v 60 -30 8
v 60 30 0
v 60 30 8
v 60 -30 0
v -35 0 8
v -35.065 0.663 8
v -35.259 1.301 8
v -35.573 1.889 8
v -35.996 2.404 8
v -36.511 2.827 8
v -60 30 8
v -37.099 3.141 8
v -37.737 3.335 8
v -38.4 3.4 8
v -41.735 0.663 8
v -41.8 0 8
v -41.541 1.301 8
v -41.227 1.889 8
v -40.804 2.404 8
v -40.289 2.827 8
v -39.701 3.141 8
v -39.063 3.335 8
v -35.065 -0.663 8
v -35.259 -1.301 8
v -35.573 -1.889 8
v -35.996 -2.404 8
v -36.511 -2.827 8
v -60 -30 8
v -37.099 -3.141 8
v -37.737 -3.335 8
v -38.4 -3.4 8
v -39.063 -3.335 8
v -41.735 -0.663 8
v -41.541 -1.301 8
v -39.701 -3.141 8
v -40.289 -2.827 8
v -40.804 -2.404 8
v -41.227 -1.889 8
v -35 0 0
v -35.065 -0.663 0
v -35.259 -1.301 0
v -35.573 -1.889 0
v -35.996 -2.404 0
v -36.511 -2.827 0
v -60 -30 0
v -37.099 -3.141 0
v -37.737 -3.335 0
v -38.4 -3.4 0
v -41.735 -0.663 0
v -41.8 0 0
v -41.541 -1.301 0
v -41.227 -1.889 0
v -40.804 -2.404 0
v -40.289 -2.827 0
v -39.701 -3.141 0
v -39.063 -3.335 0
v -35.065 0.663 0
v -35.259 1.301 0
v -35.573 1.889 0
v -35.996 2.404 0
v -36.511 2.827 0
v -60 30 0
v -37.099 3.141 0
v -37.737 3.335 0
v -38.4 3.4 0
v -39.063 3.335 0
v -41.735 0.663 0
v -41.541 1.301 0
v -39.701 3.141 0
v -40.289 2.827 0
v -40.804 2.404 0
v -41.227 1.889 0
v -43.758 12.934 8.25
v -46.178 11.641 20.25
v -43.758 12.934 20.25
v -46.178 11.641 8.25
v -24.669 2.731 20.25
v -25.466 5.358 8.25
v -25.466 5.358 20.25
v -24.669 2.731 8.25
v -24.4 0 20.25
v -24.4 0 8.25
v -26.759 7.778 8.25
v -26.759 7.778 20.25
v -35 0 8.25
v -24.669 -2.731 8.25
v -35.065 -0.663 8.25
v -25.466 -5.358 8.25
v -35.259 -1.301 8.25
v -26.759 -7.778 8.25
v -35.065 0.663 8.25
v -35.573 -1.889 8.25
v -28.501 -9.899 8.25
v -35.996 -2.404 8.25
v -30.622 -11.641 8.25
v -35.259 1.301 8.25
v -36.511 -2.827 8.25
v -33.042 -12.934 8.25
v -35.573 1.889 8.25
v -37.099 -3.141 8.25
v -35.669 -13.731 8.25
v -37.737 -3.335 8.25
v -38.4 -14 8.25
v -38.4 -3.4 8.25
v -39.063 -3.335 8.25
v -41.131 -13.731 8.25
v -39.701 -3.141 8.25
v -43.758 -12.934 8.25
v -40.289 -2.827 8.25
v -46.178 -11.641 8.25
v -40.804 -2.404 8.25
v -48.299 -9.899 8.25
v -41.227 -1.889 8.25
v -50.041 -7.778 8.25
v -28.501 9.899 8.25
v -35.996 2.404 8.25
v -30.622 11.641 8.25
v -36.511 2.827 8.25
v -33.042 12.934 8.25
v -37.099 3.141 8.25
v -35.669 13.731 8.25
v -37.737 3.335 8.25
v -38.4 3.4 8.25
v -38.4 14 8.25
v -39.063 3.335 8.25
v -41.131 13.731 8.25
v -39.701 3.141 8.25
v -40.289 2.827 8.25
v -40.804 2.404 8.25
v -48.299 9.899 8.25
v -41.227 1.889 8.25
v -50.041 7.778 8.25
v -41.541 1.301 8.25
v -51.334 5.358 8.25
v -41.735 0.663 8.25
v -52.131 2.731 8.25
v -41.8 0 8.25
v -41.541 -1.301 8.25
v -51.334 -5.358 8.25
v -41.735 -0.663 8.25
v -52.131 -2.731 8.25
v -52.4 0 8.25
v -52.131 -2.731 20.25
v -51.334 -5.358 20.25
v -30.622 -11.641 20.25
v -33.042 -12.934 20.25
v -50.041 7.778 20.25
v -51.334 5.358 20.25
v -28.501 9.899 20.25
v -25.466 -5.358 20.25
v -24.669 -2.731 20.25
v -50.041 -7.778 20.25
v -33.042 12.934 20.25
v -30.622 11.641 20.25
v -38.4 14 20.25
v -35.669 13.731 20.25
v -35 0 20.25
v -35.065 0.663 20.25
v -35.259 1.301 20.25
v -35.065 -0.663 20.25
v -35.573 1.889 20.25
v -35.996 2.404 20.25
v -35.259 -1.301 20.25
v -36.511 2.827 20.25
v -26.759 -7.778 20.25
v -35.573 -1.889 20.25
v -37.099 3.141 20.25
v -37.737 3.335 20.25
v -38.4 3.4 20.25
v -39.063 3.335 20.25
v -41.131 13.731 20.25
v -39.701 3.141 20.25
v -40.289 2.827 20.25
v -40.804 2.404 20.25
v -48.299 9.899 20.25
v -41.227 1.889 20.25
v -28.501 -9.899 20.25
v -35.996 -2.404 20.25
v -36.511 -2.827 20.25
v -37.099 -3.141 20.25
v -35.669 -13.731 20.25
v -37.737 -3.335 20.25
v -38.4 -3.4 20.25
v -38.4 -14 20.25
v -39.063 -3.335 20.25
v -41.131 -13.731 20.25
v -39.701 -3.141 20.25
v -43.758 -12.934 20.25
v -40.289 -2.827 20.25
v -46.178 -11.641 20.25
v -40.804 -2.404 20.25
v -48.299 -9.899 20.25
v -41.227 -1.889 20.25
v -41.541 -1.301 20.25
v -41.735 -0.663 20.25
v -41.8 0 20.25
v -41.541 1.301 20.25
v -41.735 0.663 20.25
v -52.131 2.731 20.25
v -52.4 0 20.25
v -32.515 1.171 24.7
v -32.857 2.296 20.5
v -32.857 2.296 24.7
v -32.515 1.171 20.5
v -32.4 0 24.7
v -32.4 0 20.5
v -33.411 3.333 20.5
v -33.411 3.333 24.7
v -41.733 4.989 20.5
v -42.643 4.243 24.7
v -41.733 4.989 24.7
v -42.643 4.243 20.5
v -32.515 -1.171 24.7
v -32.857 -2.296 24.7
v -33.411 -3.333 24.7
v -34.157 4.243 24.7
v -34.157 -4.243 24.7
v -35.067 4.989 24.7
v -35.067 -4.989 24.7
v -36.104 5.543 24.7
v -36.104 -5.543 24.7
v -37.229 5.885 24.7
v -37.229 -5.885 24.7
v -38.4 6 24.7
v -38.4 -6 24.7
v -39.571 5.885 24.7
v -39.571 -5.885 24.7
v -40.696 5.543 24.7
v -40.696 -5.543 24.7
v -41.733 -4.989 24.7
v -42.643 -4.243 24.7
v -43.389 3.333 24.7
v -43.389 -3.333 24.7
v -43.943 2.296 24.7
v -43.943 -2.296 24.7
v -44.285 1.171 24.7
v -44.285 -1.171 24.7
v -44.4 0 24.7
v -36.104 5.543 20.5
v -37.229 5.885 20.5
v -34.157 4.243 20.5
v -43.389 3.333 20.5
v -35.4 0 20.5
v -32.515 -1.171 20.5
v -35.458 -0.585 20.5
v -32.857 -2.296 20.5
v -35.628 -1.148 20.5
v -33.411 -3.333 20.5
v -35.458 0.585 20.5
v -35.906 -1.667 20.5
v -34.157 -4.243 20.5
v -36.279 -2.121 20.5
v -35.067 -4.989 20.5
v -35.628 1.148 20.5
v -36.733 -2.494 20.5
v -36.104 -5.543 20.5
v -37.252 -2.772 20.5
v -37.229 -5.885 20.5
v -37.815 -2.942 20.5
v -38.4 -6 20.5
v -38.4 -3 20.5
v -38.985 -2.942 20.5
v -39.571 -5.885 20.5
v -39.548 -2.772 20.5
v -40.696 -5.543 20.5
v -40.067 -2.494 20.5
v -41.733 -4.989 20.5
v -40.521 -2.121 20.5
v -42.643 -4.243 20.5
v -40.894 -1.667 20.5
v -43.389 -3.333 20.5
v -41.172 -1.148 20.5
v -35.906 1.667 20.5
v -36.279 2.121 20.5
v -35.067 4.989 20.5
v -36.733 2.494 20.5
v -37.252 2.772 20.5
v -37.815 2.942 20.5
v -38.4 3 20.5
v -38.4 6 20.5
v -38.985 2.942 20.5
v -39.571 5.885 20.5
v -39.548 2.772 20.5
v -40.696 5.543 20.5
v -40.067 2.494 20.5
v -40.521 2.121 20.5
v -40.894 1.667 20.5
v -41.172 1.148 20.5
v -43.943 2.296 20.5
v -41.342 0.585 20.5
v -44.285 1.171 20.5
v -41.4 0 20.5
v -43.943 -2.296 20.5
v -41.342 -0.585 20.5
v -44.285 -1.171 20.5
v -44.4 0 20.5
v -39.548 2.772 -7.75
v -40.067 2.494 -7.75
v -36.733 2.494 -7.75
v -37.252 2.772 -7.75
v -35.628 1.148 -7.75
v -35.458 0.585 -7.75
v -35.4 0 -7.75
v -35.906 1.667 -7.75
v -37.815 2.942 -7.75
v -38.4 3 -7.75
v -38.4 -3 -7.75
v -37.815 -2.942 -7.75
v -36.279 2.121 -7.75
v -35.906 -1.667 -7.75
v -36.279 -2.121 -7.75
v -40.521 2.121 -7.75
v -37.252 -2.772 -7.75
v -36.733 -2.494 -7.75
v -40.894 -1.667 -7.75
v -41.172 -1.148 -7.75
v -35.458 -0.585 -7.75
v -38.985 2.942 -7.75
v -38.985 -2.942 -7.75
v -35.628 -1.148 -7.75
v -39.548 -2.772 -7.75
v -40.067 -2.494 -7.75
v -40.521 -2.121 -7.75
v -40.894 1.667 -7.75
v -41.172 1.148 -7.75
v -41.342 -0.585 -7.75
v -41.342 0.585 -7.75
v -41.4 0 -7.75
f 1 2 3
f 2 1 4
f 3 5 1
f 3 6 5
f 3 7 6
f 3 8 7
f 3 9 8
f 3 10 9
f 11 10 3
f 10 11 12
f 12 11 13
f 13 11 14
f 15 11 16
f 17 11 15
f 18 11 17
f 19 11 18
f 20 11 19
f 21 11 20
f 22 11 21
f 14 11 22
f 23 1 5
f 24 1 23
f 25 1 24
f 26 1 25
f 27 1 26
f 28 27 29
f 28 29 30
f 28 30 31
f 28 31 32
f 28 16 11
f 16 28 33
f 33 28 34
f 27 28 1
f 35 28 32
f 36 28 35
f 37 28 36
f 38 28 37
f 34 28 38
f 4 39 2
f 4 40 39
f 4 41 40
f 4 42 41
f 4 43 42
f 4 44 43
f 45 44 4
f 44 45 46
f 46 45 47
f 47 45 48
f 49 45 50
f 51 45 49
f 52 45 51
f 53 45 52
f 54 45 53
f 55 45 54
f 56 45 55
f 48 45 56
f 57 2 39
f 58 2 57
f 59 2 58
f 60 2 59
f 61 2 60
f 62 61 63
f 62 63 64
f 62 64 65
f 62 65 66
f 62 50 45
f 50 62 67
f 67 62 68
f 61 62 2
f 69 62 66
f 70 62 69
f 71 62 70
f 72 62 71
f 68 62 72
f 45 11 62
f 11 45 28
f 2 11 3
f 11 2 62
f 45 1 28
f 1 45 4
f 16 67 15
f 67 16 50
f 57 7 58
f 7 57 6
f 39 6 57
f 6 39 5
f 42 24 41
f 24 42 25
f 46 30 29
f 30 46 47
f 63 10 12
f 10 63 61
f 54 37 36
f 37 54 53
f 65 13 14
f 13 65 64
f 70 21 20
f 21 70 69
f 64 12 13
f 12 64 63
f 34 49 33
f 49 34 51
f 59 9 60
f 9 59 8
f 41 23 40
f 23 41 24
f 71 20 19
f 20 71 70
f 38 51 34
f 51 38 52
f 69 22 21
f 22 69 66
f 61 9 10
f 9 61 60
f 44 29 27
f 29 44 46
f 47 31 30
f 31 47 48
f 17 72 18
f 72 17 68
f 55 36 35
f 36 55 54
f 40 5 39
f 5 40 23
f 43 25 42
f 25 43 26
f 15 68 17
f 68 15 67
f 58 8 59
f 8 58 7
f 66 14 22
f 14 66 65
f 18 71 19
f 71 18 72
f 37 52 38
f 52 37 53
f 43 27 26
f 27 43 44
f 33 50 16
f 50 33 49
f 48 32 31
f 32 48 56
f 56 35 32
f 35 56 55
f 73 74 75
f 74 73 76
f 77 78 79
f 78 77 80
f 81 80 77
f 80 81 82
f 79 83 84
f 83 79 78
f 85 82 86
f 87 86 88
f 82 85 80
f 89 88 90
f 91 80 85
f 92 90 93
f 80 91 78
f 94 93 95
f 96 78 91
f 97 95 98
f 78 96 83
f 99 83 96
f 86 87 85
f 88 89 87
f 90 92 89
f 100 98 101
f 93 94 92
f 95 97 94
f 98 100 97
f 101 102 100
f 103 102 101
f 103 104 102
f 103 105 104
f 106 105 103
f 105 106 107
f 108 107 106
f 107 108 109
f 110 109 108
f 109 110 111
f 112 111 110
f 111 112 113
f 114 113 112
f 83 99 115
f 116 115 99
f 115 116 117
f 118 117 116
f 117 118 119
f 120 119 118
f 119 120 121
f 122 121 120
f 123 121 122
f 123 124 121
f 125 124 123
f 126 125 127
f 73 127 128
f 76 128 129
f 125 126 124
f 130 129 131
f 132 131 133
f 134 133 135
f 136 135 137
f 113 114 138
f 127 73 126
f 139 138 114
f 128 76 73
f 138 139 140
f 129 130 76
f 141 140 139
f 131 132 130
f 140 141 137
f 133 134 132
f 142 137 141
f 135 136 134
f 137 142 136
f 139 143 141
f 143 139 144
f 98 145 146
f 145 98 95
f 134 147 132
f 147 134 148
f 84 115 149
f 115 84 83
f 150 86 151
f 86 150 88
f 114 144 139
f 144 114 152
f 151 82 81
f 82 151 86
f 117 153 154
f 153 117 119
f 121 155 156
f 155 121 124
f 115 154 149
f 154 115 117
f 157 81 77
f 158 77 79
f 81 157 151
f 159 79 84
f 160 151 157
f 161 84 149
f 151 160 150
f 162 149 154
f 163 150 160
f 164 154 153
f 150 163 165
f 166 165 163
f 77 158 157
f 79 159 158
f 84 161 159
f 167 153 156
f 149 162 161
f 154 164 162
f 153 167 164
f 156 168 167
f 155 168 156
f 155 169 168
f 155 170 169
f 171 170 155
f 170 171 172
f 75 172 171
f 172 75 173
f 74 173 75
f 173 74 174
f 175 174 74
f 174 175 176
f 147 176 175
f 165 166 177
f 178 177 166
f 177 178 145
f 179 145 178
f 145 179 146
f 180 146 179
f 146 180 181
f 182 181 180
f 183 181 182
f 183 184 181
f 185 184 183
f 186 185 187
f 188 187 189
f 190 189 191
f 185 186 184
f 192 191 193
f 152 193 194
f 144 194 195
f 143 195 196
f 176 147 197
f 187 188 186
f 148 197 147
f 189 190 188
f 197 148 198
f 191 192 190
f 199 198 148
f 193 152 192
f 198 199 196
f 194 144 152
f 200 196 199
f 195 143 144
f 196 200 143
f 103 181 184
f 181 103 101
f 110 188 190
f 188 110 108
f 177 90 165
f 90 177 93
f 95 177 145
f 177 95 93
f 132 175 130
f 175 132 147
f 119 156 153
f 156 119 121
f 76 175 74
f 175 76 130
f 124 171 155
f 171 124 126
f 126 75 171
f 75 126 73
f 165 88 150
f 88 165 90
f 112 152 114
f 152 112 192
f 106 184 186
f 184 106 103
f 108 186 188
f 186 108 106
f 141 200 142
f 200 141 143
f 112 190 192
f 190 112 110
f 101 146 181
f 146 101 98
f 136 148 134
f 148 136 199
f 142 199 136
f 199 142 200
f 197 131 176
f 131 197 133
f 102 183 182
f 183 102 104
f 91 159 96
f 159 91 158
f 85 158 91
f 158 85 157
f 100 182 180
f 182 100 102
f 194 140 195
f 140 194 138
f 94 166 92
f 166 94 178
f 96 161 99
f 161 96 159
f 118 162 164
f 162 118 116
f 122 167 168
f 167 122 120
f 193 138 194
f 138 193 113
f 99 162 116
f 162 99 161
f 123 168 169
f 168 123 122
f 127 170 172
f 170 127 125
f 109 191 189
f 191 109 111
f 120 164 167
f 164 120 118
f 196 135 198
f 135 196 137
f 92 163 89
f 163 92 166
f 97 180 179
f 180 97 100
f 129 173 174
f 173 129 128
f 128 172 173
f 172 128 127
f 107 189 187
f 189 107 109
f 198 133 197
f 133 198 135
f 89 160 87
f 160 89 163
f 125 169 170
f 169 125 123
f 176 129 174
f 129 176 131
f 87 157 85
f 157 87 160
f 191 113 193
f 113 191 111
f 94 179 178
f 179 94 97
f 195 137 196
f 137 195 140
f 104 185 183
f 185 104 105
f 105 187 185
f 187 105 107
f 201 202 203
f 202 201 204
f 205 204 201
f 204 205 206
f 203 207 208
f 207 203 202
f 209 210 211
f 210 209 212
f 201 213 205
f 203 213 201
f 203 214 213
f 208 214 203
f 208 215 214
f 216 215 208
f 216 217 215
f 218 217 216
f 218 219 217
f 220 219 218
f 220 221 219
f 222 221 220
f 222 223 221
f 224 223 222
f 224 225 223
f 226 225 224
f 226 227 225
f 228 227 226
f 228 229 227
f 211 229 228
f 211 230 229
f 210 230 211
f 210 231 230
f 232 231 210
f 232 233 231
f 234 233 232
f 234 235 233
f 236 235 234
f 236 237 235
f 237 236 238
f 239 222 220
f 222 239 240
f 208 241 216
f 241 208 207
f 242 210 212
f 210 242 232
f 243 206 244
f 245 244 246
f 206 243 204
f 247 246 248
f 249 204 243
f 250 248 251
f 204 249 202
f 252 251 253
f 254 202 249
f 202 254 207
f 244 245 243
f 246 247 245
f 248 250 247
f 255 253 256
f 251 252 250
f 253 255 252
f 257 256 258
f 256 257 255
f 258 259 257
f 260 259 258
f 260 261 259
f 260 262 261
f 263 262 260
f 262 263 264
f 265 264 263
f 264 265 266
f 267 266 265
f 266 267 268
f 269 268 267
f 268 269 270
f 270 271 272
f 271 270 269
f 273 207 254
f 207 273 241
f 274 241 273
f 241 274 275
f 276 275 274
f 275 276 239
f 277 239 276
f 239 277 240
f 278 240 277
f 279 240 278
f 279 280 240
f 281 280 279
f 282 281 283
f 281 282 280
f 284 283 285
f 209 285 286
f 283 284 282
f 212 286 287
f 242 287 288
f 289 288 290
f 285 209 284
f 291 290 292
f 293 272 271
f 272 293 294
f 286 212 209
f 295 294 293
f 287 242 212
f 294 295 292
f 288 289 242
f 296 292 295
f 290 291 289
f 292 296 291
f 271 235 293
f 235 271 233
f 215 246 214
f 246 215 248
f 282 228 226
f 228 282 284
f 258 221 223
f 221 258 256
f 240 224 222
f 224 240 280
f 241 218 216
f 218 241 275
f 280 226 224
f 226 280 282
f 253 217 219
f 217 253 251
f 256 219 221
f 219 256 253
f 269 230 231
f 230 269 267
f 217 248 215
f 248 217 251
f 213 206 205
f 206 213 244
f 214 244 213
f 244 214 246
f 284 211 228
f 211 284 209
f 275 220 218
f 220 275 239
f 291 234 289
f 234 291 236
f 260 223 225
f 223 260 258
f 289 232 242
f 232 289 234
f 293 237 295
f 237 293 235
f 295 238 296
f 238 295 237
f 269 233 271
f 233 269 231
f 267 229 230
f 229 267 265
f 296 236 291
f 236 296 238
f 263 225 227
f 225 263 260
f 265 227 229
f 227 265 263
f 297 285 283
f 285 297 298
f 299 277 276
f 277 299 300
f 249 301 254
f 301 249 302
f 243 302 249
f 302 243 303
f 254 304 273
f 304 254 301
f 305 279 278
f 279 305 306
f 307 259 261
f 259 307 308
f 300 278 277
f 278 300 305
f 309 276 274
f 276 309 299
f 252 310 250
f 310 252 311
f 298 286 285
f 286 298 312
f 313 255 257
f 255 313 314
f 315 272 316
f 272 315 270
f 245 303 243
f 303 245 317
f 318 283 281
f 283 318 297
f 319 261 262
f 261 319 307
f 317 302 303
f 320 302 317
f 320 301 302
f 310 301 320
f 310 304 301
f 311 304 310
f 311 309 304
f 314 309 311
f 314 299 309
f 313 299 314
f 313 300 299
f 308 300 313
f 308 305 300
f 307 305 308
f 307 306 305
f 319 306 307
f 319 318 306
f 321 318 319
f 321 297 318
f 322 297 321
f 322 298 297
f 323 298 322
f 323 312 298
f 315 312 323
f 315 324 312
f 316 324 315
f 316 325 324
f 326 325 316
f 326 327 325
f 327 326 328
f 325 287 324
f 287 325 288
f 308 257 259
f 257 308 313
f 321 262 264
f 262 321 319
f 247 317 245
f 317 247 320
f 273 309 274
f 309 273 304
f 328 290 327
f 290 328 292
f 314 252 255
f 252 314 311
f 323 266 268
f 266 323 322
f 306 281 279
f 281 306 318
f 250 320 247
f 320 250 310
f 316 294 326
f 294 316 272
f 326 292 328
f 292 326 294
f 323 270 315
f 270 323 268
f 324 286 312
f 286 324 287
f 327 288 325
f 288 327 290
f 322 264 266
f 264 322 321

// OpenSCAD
$fn = 32;

// ------------------------------------------------------------------------
// Standoff columns: 1 d28 standoffs, bolts d6
// Every part is its own module, assembly() places them once.
// ------------------------------------------------------------------------

// --- part 1 ---
module base_plate() {
  difference() {
    translate([-60, -30, 0]) cube([120, 60, 8]);
    translate([-38.4, 0, -1]) cylinder(h = 10, d = 6.8);
  }
}

// --- part 2 ---
module spacer() {
  difference() {
      translate([0, 0, 0]) cylinder(h = 12, d = 28);
      translate([0, 0, -1]) cylinder(h = 14, d = 6.8);
    }
}

// --- part 3 ---
module bolt() {
  cylinder(h = 4.2, d = 12);
  translate([0, 0, -28.25]) cylinder(h = 28.25, d = 6);
}

// --- assembly ---
module assembly() {
  translate([0, 0, 0]) rotate([0, 0, 0]) base_plate();
  translate([-38.4, 0, 8.25]) rotate([0, 0, 0]) spacer();
  translate([-38.4, 0, 20.5]) rotate([0, 0, 0]) bolt();
}

assembly();
